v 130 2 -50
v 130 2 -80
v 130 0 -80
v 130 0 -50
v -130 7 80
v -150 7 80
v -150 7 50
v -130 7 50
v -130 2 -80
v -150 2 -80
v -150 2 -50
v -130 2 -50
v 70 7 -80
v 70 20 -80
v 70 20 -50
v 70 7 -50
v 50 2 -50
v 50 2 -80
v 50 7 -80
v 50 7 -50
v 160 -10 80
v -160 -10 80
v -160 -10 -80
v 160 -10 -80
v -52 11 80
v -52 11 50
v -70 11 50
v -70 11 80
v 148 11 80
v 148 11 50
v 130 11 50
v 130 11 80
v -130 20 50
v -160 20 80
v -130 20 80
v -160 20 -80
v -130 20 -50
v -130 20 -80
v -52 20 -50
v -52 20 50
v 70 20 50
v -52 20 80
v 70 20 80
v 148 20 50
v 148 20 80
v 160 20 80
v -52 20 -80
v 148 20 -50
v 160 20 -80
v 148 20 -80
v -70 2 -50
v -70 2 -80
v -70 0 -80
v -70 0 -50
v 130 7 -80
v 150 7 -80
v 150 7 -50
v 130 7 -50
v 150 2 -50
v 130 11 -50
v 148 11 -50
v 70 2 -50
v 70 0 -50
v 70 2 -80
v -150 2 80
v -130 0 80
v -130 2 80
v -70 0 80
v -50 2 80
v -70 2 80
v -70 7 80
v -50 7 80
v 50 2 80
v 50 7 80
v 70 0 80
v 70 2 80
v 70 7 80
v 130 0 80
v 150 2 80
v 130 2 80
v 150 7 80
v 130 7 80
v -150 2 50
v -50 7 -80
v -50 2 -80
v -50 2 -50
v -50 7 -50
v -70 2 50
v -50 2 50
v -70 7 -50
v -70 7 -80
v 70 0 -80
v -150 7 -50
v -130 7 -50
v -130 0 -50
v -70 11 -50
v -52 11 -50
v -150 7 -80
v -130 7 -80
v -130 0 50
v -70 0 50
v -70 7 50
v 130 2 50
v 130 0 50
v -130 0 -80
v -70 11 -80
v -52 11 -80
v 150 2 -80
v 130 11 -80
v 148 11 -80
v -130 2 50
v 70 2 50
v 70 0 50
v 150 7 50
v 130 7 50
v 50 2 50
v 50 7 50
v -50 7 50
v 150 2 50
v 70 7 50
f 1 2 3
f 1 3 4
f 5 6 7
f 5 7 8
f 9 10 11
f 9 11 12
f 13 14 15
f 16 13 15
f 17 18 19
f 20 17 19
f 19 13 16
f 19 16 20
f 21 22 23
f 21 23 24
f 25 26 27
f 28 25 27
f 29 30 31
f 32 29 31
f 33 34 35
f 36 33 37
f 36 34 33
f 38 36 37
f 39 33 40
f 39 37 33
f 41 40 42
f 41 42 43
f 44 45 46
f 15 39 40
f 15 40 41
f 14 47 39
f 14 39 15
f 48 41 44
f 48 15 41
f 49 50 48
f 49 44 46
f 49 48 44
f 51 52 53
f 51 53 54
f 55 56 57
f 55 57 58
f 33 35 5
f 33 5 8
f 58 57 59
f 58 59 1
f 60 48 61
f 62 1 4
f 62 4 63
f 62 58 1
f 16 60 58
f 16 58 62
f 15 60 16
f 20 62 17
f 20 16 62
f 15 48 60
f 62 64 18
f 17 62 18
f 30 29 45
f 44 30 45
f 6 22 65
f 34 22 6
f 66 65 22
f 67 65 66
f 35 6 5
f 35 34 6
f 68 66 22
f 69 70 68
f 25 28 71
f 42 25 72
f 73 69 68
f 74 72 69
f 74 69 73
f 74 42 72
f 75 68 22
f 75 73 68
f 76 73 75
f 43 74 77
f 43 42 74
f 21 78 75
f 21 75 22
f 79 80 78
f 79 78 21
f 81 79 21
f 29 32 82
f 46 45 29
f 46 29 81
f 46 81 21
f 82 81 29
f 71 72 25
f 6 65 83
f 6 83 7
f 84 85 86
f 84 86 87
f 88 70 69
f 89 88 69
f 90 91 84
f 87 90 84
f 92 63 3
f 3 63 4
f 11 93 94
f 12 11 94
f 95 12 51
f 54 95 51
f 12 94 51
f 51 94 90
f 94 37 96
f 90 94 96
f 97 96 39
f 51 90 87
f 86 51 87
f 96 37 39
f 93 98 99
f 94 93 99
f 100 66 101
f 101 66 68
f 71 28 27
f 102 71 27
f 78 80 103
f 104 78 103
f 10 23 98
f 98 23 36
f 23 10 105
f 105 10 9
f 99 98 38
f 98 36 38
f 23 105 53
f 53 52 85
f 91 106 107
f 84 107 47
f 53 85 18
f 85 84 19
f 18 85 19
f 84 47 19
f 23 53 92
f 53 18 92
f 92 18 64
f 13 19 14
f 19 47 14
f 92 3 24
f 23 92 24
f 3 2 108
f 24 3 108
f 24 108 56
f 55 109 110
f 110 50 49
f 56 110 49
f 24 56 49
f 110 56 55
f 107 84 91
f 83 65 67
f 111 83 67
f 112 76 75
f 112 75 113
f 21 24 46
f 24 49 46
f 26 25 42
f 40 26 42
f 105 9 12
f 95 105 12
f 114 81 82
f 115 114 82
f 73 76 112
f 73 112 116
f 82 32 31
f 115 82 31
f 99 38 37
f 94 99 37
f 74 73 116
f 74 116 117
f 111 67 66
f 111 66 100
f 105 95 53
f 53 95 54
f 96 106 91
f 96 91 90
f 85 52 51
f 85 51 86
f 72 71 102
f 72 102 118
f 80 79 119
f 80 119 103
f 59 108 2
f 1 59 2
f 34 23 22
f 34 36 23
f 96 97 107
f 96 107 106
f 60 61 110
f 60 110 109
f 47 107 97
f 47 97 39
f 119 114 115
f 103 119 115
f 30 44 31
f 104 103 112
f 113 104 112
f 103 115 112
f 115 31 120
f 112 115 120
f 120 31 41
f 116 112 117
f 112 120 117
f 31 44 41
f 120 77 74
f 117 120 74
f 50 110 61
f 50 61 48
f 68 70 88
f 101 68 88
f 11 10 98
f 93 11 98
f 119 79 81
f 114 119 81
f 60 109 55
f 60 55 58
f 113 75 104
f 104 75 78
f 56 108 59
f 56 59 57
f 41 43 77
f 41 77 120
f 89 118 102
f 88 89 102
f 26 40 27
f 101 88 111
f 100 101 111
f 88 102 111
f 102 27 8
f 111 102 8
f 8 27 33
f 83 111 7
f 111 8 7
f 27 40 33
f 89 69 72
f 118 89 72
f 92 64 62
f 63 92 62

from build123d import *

# Parameters (mm, degrees)
SKETCH1_W               = 320
SKETCH1_H               = 160
BOSS_EXTRUDE1_DEPTH     = 20
SKETCH2_W               = 60
SKETCH2_H               = 30
CUT_EXTRUDE1_DEPTH      = 28
SKETCH3_W               = 20
SKETCH3_H               = 5
CUT_EXTRUDE3_DEPTH      = 30
MIRROR3_COPY_1_SKETCH_W = 60
MIRROR3_COPY_1_SKETCH_H = 30
MIRROR3_COPY_1_DEPTH    = 28
MIRROR3_COPY_2_SKETCH_W = 20
MIRROR3_COPY_2_SKETCH_H = 5
MIRROR3_COPY_2_DEPTH    = 30
SKETCH8_W               = 18
SKETCH8_H               = 9
CUT_EXTRUDE6_DEPTH      = 30
SKETCH9_W               = 18
SKETCH9_H               = 9
CUT_EXTRUDE7_DEPTH      = 30
SKETCH10_W              = 320
SKETCH10_H              = 160
BOSS_EXTRUDE2_DEPTH     = 10


with BuildPart() as part:
    # Sketch1 → Boss-Extrude1 (new body)
    with BuildSketch(Plane(origin=(0, 0, 0), x_dir=(1, 0, 0), z_dir=(0, 1, 0))):
        Rectangle(SKETCH1_W, SKETCH1_H)
    extrude(amount=BOSS_EXTRUDE1_DEPTH)

    # Sketch2 → Cut-Extrude1 (cut)
    with BuildSketch(Plane(origin=(0, 20, 0), x_dir=(1, 0, 0), z_dir=(0, 1, 0))):
        with Locations((-100, -65)):
            Rectangle(SKETCH2_W, SKETCH2_H)
    cut_extrude1 = extrude(amount=-CUT_EXTRUDE1_DEPTH, mode=Mode.SUBTRACT)

    # Sketch3 → Cut-Extrude3 (cut)
    with BuildSketch(Plane.XY.offset(80)):
        with Locations((-140, 4.5)):
            Rectangle(SKETCH3_W, SKETCH3_H)
        with Locations((-60, 4.5)):
            Rectangle(SKETCH3_W, SKETCH3_H)
    cut_extrude3 = extrude(amount=-CUT_EXTRUDE3_DEPTH, mode=Mode.SUBTRACT)

    # Mirror2: Cut-Extrude1, Cut-Extrude3 across plane
    add(cut_extrude1.mirror(Plane(origin=(0, 0, 0), x_dir=(0, 0, 1), z_dir=(1, 0, 0))), mode=Mode.SUBTRACT)
    add(cut_extrude3.mirror(Plane(origin=(0, 0, 0), x_dir=(0, 0, 1), z_dir=(1, 0, 0))), mode=Mode.SUBTRACT)

    # Mirror3: Cut-Extrude1, Cut-Extrude3 across plane
    add(cut_extrude1.mirror(Plane.XY), mode=Mode.SUBTRACT)
    add(cut_extrude3.mirror(Plane.XY), mode=Mode.SUBTRACT)

    # Mirror3 copy 1 sketch → Mirror3 copy 1 (cut)
    with BuildSketch(Plane(origin=(0, 20, 0), x_dir=(-1, 0, 0), z_dir=(0, 1, 0))):
        with Locations((-100, -65)):
            Rectangle(MIRROR3_COPY_1_SKETCH_W, MIRROR3_COPY_1_SKETCH_H)
    extrude(amount=-MIRROR3_COPY_1_DEPTH, mode=Mode.SUBTRACT)

    # Mirror3 copy 2 sketch → Mirror3 copy 2 (cut)
    with BuildSketch(Plane(origin=(0, 0, -80), x_dir=(-1, 0, 0), z_dir=(0, 0, -1))):
        with Locations((-140, 4.5)):
            Rectangle(MIRROR3_COPY_2_SKETCH_W, MIRROR3_COPY_2_SKETCH_H)
        with Locations((-60, 4.5)):
            Rectangle(MIRROR3_COPY_2_SKETCH_W, MIRROR3_COPY_2_SKETCH_H)
    extrude(amount=-MIRROR3_COPY_2_DEPTH, mode=Mode.SUBTRACT)

    # Sketch8 → Cut-Extrude6 (cut)
    with BuildSketch(Plane(origin=(0, 0, -80), x_dir=(-1, 0, 0), z_dir=(0, 0, -1))):
        with Locations((-139, 15.5)):
            Rectangle(SKETCH8_W, SKETCH8_H)
    cut_extrude6 = extrude(amount=-CUT_EXTRUDE6_DEPTH, mode=Mode.SUBTRACT)

    # Sketch9 → Cut-Extrude7 (cut)
    with BuildSketch(Plane(origin=(0, 0, -80), x_dir=(-1, 0, 0), z_dir=(0, 0, -1))):
        with Locations((61, 15.5)):
            Rectangle(SKETCH9_W, SKETCH9_H)
    cut_extrude7 = extrude(amount=-CUT_EXTRUDE7_DEPTH, mode=Mode.SUBTRACT)

    # Sketch10 → Boss-Extrude2 (add)
    with BuildSketch(Plane.XZ):
        Rectangle(SKETCH10_W, SKETCH10_H)
    extrude(amount=BOSS_EXTRUDE2_DEPTH)

    # Mirror4: Cut-Extrude6, Cut-Extrude7 across plane
    add(cut_extrude6.mirror(Plane.XY), mode=Mode.SUBTRACT)
    add(cut_extrude7.mirror(Plane.XY), mode=Mode.SUBTRACT)


solid = part.part
